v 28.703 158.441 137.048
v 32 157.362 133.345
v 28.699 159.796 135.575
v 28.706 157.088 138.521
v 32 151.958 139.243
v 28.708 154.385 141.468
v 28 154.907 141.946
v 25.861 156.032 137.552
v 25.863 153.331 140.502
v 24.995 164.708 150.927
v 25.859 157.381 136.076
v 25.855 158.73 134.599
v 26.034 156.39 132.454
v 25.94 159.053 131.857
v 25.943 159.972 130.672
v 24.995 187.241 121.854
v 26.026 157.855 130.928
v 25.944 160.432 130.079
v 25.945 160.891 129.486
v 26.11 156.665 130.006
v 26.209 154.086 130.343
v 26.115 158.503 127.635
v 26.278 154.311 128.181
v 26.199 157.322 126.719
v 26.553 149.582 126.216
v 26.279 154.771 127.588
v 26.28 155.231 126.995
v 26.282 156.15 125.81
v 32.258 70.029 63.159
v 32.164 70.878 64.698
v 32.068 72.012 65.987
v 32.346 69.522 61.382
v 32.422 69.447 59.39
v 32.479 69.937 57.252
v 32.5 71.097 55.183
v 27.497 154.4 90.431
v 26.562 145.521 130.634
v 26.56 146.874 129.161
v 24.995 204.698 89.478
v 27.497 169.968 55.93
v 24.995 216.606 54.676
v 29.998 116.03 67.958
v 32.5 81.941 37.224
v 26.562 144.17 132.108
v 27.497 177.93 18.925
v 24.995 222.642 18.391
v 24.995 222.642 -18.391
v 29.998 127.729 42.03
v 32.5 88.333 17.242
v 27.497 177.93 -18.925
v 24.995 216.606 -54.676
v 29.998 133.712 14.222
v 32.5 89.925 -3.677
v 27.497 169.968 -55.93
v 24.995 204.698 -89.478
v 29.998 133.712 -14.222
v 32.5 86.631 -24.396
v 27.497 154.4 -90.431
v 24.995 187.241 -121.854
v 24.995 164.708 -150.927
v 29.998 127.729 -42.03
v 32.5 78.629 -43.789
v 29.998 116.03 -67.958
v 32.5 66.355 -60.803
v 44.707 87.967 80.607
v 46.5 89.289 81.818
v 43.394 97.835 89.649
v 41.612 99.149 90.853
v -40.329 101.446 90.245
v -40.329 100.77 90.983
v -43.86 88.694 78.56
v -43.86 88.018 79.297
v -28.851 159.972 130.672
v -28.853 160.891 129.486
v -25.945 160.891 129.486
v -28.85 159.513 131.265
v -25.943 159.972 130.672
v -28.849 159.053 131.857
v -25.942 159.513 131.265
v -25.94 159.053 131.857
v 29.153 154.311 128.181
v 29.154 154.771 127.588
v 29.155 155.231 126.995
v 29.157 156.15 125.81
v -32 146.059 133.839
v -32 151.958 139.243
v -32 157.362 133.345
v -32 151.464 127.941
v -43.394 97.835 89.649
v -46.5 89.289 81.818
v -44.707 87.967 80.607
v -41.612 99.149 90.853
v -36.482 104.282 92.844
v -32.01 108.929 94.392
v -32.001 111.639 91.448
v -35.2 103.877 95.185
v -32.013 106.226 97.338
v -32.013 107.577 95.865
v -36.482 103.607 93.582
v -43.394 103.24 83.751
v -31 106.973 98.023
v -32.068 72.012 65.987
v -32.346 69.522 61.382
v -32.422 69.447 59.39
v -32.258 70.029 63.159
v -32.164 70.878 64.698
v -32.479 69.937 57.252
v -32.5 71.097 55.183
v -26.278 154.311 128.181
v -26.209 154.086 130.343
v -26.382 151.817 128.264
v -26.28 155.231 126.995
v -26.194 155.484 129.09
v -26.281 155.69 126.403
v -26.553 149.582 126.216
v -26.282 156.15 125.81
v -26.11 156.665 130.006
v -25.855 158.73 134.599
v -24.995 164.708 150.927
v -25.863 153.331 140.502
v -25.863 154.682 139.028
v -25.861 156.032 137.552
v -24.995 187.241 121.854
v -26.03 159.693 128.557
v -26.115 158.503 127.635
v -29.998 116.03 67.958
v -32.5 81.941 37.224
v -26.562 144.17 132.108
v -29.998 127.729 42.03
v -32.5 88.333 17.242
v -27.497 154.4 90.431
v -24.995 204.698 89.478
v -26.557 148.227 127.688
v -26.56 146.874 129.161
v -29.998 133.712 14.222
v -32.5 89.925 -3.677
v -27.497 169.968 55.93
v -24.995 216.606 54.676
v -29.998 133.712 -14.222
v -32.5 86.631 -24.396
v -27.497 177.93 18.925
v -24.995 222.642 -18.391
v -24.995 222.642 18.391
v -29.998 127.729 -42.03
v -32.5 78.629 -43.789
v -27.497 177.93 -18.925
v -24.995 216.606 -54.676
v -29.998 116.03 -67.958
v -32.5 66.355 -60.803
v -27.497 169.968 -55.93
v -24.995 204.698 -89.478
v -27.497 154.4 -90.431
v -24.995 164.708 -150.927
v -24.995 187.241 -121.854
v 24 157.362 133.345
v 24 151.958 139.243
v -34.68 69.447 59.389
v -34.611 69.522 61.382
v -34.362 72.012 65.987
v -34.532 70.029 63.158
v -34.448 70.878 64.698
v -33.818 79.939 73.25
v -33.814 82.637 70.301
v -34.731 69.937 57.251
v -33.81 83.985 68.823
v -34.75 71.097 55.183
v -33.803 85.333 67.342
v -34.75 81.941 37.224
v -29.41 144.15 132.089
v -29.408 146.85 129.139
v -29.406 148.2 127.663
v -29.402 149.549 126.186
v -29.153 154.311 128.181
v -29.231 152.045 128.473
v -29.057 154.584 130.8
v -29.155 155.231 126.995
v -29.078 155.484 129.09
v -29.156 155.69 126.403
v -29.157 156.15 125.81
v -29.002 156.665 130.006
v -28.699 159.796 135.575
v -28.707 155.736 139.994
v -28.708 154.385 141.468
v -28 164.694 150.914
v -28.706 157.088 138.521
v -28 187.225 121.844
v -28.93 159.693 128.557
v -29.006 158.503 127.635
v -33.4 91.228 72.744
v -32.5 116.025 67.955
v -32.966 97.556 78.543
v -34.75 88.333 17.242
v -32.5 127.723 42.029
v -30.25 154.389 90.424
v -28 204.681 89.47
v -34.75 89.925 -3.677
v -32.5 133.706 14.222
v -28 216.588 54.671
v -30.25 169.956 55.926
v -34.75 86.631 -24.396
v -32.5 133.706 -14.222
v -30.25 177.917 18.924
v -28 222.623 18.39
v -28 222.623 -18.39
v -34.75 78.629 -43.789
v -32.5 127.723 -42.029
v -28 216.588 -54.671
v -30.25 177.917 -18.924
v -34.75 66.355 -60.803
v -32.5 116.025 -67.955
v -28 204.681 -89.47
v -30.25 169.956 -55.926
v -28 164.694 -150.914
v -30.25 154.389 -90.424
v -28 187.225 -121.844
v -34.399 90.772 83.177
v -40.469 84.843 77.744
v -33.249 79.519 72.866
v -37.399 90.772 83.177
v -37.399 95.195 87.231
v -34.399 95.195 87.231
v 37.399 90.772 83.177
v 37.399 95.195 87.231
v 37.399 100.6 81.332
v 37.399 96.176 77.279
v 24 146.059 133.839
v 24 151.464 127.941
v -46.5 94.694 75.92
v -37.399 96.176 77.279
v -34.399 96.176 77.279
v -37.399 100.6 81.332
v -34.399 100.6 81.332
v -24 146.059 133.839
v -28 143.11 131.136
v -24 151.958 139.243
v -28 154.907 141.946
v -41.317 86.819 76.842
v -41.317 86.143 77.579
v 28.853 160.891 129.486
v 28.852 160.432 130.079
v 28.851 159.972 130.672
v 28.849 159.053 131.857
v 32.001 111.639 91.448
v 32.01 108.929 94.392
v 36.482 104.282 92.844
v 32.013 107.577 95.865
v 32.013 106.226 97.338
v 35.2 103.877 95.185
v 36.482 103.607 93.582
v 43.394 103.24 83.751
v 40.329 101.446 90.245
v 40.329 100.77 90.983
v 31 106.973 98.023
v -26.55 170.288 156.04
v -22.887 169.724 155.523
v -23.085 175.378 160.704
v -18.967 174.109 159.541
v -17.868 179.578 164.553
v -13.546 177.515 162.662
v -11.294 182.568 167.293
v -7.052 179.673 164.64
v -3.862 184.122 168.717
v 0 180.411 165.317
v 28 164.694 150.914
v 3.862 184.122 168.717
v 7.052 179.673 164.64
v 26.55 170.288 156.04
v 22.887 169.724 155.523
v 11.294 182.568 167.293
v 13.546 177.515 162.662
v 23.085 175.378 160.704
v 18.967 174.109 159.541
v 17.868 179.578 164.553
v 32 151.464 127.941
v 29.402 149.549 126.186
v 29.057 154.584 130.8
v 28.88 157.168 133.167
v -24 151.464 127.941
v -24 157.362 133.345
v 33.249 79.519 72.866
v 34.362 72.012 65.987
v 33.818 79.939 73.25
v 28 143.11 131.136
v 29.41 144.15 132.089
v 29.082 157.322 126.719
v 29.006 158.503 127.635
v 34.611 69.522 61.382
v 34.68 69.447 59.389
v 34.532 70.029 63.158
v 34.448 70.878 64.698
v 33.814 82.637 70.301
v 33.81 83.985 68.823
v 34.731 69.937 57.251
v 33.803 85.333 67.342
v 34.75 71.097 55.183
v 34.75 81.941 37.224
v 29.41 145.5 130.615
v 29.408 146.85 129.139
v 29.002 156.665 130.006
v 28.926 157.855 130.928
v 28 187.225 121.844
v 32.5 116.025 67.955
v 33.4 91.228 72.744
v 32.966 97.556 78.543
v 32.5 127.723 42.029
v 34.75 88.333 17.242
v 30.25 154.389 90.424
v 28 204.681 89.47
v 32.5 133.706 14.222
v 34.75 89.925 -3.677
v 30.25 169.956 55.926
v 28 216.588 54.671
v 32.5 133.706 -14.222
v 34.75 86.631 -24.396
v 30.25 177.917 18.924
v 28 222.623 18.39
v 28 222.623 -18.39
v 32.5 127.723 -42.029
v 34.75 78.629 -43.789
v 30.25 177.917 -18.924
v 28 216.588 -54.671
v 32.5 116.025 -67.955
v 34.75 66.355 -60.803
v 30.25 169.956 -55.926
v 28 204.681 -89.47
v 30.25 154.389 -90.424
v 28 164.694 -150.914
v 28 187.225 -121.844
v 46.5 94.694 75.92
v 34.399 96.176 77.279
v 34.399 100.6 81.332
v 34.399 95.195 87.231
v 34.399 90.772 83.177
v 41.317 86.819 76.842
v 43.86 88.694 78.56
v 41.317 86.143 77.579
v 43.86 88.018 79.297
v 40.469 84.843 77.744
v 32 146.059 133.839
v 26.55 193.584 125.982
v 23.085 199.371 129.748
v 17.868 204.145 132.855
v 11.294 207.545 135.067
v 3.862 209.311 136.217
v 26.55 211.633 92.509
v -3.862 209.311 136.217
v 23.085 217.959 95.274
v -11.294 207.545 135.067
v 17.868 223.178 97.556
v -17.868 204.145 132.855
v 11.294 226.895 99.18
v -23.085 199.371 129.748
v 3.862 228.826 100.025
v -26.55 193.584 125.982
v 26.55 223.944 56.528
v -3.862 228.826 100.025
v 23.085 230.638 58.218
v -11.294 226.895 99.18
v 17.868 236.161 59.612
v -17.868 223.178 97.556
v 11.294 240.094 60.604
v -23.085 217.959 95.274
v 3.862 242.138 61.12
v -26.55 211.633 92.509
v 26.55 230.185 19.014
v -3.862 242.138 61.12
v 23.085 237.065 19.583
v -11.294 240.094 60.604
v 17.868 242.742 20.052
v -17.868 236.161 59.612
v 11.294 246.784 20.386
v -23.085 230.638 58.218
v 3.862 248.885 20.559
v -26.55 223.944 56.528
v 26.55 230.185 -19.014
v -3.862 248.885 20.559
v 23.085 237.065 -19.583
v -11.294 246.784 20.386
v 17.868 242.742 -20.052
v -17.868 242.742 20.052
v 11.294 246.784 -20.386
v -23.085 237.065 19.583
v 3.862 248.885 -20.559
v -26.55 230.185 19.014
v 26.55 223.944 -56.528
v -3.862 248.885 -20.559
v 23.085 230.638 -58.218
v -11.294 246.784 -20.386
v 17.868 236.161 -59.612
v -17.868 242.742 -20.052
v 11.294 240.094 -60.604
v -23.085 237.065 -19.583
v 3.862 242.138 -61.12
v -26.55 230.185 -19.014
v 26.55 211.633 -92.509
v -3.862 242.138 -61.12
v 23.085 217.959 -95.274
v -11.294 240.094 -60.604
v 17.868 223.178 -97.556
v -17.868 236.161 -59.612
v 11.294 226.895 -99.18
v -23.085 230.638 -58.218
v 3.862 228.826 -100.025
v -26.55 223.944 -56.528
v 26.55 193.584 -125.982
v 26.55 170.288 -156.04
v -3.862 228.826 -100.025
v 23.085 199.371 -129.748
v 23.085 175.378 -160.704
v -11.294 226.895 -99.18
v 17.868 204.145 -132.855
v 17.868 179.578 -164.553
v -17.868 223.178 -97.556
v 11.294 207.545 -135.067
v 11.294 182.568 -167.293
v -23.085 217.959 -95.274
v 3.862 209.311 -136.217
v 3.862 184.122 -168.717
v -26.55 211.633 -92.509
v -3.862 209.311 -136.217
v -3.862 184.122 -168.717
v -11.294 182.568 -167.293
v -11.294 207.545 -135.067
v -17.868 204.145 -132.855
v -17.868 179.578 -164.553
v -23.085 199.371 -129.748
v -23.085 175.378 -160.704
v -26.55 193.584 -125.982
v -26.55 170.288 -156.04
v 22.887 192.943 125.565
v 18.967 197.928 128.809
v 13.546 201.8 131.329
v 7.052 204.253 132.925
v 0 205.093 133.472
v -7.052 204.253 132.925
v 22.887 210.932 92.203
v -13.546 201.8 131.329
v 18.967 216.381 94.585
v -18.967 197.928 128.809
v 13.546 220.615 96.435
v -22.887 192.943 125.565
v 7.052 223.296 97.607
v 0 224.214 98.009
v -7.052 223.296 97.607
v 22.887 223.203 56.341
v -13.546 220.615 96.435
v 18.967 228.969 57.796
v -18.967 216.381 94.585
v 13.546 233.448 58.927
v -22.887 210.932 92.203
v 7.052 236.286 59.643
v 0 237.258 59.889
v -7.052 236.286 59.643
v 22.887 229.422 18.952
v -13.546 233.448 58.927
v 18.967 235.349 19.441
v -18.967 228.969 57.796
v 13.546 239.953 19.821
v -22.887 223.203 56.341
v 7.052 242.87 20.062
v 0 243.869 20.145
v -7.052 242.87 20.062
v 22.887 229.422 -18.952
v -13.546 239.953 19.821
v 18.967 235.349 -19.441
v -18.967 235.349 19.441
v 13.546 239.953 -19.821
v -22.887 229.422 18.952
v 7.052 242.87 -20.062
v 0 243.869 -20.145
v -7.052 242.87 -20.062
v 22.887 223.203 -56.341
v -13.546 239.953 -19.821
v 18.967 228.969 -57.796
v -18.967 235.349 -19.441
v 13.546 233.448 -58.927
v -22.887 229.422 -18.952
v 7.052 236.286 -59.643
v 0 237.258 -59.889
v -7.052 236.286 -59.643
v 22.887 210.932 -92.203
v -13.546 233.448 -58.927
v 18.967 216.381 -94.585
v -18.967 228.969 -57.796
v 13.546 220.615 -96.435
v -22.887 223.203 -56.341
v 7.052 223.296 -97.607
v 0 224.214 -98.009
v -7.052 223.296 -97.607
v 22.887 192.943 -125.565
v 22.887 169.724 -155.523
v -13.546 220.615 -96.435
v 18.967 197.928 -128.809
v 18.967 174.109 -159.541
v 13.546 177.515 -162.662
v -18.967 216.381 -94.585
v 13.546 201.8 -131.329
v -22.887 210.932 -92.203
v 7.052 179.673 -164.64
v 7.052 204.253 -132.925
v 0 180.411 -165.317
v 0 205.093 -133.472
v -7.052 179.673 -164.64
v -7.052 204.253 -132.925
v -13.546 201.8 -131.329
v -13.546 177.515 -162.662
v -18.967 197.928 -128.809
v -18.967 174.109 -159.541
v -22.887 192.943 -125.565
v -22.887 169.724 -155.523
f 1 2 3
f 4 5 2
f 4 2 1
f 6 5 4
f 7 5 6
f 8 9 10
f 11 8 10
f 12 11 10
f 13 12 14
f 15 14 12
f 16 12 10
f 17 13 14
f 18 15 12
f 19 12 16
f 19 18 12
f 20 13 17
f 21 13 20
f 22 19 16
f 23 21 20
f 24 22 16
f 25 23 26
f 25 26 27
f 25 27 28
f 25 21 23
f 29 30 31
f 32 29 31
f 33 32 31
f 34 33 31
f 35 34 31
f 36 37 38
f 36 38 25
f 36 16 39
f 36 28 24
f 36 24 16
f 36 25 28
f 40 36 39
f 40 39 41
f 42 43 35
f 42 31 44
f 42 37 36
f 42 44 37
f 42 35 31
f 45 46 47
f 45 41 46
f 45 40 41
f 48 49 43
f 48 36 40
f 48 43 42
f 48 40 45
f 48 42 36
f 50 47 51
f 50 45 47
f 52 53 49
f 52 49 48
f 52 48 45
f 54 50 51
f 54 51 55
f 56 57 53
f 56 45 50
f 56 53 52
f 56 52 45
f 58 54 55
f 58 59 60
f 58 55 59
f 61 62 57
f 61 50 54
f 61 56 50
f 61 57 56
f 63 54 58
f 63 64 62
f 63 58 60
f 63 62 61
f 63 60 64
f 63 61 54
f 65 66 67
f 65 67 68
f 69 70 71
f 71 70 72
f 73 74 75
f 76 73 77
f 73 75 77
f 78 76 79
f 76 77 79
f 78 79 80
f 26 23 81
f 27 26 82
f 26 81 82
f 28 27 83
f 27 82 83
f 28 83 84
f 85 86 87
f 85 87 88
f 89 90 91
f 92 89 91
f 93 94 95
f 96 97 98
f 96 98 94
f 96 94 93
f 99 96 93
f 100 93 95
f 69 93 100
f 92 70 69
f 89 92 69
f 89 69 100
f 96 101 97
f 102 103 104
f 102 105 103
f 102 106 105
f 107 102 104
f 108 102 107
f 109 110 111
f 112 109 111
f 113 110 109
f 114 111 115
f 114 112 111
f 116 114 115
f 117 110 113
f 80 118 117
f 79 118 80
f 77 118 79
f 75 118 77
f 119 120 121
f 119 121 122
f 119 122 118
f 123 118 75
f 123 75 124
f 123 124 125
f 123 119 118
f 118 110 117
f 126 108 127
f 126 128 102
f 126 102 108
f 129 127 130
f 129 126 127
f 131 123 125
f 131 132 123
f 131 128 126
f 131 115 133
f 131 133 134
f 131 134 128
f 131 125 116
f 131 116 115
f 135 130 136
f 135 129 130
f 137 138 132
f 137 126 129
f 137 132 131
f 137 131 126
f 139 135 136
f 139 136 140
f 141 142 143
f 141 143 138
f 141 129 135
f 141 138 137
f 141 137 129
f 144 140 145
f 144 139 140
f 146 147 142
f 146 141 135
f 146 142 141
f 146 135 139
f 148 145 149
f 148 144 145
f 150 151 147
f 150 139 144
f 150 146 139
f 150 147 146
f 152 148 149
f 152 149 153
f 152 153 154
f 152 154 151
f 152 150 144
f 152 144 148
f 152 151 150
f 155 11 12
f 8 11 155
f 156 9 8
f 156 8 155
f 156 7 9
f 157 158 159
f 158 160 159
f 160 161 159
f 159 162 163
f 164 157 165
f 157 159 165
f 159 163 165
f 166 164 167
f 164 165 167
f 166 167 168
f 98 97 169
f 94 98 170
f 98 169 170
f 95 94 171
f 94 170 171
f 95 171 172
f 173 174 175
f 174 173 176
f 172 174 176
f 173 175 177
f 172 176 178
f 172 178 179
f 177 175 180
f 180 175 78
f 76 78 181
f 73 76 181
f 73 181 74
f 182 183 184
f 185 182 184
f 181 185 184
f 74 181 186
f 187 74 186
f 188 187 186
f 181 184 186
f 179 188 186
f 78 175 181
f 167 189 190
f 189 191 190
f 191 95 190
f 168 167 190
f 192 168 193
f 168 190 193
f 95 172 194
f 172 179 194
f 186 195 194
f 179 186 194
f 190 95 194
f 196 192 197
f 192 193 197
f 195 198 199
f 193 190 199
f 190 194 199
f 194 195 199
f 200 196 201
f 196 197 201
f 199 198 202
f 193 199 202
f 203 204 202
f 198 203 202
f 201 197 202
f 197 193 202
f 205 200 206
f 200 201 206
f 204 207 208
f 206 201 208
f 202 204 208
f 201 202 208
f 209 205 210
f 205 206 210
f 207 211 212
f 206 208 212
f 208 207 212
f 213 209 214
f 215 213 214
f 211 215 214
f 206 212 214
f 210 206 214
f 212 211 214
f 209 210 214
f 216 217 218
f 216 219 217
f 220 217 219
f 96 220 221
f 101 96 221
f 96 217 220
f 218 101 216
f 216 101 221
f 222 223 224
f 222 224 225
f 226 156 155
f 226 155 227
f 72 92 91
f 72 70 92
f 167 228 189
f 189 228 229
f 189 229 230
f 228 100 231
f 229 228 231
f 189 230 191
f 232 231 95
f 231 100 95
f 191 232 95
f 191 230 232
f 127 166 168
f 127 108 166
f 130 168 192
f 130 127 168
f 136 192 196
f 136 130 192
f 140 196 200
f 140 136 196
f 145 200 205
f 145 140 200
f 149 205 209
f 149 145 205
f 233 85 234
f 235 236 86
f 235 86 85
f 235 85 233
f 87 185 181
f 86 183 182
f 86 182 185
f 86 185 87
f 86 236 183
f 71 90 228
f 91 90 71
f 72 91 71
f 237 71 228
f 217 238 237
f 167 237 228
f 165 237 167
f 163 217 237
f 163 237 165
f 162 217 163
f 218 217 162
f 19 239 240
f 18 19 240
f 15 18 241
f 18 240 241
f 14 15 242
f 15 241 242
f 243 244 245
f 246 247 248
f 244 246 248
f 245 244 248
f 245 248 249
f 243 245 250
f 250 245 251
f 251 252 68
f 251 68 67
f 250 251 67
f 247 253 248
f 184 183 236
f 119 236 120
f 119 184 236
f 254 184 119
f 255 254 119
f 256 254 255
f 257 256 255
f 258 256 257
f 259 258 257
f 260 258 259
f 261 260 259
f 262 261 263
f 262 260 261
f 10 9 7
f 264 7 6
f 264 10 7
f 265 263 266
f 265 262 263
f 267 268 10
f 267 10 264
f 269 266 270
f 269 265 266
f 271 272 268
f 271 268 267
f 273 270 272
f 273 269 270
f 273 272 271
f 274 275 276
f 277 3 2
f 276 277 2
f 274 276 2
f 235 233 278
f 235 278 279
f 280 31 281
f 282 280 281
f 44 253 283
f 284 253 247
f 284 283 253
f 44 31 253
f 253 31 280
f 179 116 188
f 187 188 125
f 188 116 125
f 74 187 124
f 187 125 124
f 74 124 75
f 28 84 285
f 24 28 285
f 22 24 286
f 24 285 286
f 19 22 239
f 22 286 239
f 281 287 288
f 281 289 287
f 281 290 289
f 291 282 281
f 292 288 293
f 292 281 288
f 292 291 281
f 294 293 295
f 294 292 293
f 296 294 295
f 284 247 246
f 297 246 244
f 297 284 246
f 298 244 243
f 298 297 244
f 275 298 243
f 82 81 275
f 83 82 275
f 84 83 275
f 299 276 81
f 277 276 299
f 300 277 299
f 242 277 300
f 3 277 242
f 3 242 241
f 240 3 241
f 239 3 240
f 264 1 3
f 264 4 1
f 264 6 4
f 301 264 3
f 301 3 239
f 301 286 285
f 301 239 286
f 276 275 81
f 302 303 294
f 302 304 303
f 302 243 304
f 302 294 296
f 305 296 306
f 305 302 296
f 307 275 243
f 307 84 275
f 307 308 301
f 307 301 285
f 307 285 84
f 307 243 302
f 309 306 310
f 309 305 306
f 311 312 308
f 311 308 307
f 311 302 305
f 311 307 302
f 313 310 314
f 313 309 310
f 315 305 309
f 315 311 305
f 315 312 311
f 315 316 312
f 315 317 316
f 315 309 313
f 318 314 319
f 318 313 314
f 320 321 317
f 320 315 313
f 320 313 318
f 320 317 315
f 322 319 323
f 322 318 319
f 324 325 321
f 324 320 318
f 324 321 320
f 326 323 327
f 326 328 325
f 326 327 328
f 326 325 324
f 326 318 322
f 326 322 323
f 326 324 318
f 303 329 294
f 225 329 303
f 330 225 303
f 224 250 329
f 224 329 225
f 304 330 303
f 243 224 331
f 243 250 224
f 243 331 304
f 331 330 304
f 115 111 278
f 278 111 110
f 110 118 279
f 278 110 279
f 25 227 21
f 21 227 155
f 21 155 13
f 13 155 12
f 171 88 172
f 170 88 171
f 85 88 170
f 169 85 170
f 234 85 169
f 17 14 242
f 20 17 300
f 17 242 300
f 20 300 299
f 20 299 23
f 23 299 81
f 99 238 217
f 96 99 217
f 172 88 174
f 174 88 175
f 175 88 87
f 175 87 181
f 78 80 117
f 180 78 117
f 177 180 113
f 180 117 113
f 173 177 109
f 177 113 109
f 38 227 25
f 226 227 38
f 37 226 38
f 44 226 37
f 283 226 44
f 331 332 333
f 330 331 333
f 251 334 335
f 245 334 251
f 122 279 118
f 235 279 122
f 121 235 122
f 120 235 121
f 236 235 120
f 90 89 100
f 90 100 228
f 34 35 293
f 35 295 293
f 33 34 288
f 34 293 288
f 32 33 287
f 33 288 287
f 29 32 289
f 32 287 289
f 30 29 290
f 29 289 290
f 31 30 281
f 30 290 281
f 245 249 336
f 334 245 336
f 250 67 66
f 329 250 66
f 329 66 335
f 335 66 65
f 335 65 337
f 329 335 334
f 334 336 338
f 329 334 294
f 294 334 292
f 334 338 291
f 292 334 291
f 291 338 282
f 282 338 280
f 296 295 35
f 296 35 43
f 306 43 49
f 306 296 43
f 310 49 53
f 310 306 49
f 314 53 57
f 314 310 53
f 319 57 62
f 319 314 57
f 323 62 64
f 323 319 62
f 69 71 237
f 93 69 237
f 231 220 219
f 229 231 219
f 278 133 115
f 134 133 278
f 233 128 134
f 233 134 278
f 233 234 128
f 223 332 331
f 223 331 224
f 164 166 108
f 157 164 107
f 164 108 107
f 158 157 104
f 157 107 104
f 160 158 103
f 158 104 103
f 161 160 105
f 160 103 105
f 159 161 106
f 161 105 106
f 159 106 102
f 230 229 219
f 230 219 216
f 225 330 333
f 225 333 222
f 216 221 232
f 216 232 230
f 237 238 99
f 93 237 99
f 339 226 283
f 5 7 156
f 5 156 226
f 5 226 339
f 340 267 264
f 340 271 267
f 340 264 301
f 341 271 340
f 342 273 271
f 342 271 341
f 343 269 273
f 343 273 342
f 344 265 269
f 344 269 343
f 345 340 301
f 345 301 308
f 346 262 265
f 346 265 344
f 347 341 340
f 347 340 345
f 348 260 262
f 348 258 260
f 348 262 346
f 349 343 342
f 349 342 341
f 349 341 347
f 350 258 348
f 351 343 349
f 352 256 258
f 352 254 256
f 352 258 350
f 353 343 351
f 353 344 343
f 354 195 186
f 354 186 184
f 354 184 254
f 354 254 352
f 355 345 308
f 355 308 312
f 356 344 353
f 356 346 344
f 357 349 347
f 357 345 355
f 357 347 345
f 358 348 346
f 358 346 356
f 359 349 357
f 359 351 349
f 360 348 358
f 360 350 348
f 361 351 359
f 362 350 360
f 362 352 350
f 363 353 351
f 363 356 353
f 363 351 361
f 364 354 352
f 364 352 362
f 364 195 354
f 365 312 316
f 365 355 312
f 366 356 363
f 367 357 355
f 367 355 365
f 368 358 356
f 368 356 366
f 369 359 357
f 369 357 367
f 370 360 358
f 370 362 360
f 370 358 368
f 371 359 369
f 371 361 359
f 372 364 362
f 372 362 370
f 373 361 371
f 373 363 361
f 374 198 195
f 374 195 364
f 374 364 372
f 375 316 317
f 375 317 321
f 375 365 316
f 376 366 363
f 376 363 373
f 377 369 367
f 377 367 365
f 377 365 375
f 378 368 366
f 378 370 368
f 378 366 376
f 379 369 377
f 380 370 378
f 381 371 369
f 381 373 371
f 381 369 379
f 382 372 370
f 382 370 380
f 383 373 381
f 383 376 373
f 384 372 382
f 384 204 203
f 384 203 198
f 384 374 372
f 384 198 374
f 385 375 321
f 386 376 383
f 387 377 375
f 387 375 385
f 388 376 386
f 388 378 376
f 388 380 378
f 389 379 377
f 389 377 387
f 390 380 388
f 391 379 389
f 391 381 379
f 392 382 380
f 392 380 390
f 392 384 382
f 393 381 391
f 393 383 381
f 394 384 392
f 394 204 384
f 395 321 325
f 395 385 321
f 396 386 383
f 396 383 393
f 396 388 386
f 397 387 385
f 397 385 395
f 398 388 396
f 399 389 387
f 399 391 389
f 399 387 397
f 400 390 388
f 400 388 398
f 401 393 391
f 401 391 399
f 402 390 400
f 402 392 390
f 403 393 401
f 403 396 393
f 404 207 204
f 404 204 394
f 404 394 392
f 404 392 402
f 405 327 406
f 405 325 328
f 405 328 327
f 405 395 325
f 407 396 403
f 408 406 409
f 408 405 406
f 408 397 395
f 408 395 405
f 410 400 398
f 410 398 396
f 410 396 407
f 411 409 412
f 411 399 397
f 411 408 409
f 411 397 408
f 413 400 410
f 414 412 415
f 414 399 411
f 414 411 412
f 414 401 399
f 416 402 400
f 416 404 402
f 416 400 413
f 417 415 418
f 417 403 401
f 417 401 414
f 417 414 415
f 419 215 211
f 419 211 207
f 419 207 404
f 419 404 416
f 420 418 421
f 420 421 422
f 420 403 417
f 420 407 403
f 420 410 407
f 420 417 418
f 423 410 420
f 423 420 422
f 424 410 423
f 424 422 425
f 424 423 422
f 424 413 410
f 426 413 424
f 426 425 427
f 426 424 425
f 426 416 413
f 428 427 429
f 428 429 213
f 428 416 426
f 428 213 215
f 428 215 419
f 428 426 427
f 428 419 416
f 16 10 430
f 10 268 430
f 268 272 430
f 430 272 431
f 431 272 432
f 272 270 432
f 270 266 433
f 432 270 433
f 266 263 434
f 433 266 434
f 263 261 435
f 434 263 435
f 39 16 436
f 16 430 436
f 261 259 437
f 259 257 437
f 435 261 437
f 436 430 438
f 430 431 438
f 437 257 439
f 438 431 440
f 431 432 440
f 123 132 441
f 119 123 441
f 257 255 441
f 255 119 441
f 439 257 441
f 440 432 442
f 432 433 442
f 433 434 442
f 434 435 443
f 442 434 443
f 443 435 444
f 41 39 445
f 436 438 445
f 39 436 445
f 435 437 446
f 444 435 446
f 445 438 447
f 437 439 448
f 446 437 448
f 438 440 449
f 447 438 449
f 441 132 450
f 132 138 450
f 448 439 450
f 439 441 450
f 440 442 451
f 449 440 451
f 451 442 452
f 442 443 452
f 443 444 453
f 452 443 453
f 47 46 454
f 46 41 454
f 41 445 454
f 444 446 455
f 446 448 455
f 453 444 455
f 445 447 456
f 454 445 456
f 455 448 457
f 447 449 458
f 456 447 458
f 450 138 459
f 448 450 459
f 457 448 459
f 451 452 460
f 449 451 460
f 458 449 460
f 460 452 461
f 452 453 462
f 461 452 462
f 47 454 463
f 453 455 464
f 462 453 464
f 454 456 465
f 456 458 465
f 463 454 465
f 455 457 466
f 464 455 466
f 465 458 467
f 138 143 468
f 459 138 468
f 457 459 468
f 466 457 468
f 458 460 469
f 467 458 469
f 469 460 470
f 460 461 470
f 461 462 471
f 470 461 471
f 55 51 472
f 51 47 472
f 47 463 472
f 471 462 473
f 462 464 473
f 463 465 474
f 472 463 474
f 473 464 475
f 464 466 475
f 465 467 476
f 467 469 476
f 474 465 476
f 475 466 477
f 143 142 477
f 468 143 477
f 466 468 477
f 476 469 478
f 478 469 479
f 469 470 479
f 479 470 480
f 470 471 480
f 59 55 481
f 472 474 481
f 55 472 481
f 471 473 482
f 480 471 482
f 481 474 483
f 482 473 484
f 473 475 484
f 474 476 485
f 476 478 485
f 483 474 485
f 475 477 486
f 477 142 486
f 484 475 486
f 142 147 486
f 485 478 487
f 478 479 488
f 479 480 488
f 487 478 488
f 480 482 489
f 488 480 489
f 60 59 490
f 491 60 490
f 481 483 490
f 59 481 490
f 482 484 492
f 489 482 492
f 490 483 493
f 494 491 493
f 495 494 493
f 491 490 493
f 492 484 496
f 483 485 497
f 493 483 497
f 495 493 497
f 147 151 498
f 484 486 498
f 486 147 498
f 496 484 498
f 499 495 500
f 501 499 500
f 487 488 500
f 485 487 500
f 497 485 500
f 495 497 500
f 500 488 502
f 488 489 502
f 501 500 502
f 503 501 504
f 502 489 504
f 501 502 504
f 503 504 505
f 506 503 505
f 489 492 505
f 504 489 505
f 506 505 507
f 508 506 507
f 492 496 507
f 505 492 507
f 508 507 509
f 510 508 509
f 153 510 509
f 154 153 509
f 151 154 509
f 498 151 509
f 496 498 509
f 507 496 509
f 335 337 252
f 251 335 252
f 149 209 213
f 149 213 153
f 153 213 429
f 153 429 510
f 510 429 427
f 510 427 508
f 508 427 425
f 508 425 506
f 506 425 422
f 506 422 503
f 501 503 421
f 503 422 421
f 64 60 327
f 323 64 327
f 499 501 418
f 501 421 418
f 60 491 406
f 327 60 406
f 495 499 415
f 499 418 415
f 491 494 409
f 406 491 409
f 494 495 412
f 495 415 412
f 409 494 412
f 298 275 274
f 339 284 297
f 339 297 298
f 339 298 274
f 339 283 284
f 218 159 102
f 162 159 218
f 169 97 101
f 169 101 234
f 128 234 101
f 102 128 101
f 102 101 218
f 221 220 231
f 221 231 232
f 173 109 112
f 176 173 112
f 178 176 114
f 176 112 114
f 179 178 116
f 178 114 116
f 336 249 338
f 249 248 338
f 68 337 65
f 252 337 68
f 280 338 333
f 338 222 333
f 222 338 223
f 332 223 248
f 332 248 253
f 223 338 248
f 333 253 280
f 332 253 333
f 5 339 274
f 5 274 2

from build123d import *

# Parameters (mm, degrees)
REVOLUTION_ANGLE = 85
FILLET_R         = 8
PAD_DEPTH        = 8
POCKET_DEPTH     = 2
CHAMFER_SIZE     = 1
SKETCH005_W      = 3
SKETCH005_H      = 7
POCKET001_DEPTH  = 87.696576
POCKET002_DEPTH  = 78.501
SKETCH007_W      = 3
SKETCH007_H      = 6
POCKET003_DEPTH  = 87.696576


with BuildPart() as part:
    # Sketch → Revolution (revolve, symmetric)
    with BuildSketch(Plane.XY) as revolution_sk:
        with BuildLine():
            ThreePointArc((28, 223.38116), (0, 250), (-28, 223.38116))
            Line((-34.75, 90), (-28, 223.38116))
            Line((-34.75, 90), (-32.5, 90))
            Line((-32.5, 90), (-24.995207, 223.4))
            ThreePointArc((24.995207, 223.4), (0, 244.699412), (-24.995207, 223.4))
            Line((24.995207, 223.4), (32.5, 90))
            Line((32.5, 90), (34.75, 90))
            Line((34.75, 90), (28, 223.38116))
        make_face()
    revolve(axis=Axis((0, 0, 0), (1, 0, 0)), revolution_arc=REVOLUTION_ANGLE / 2)
    revolve(revolution_sk.sketch, axis=Axis((0, 0, 0), (-1, 0, 0)), revolution_arc=REVOLUTION_ANGLE / 2)

    # Fillet
    fillet_edges = [part.edges().sort_by_distance(p)[0] for p in [
        (33.625, 66.35496, 60.803119),
        (-33.625, 66.35496, 60.803119),
    ]]
    fillet(fillet_edges, radius=FILLET_R)

    # Sketch002 (on Face5 of Fillet) → Pad (new body)
    with BuildSketch(Plane(origin=(0, 0, 0), x_dir=(1, 0, 0), z_dir=(0, -0.67559, 0.737277))):
        Polygon((-43.394171, 132.697505), (-46.5, 121.106395), (-33.248819, 107.855214), (-31, 145.091677), align=None)
        Polygon((43.394171, 132.697505), (46.5, 121.106395), (33.248819, 107.855214), (31, 145.091677), align=None)
        Polygon((28, 194.106395), (32, 198.106395), (32, 206.106395), (28, 210.106395), (24, 206.106395), (24, 198.106395), align=None)
        Polygon((-28, 194.106395), (-24, 198.106395), (-24, 206.106395), (-28, 210.106395), (-32, 206.106395), (-32, 198.106395), align=None)
    extrude(amount=-PAD_DEPTH)

    # Sketch003 (on Face47 of Pad) → Pocket (cut)
    with BuildSketch(Plane(origin=(0, 0, 0), x_dir=(1, 0, 0), z_dir=(0, -0.67559, 0.737277))):
        Polygon((35, 146.869795), (45, 97.88), (47.939388, 98.48), (37.939388, 147.469795), align=None)
        Polygon((-47.939388, 98.48), (-45, 97.88), (-35, 146.869795), (-37.939388, 147.469795), align=None)
    extrude(amount=-POCKET_DEPTH, mode=Mode.SUBTRACT)

    # Chamfer
    chamfer_edges = [part.edges().sort_by_distance(p)[0] for p in [
        (42.094426, 93.718526, 85.877207),
        (38.89944, 94.199359, 86.317809),
        (-38.89944, 94.199359, 86.317809),
        (-42.094426, 93.718526, 85.877207),
    ]]
    chamfer(chamfer_edges, length=CHAMFER_SIZE)

    # Sketch005 (on Face6 of Chamfer) → Pocket001 (cut, through all)
    with BuildSketch(Plane(origin=(0, 5.404722, -5.898219), x_dir=(1, 0, 0), z_dir=(0, 0.67559, -0.737277))):
        with Locations((-36.047712, 125.078524)):
            Rectangle(SKETCH005_W, SKETCH005_H)
        with Locations((36.047712, 125.078524)):
            Rectangle(SKETCH005_W, SKETCH005_H)
    extrude(amount=-POCKET001_DEPTH, mode=Mode.SUBTRACT)

    # Sketch006 → Pocket002 (cut, through all)
    with BuildSketch(Plane.YZ.offset(32)):
        Polygon((154.311436, 128.180853), (156.149665, 125.810007), (160.891358, 129.486466), (159.053128, 131.857312), align=None)
    extrude(amount=-POCKET002_DEPTH, mode=Mode.SUBTRACT)

    # Sketch007 (on Face6 of Pocket002) → Pocket003 (cut, through all)
    with BuildSketch(Plane(origin=(0, 5.404722, -5.898219), x_dir=(1, 0, 0), z_dir=(0, 0.67559, -0.737277))):
        with Locations((-35.898523, -126.117473)):
            Rectangle(SKETCH007_W, SKETCH007_H)
        with Locations((35.898523, -126.117473)):
            Rectangle(SKETCH007_W, SKETCH007_H)
    extrude(amount=-POCKET003_DEPTH, mode=Mode.SUBTRACT)


solid = part.part
